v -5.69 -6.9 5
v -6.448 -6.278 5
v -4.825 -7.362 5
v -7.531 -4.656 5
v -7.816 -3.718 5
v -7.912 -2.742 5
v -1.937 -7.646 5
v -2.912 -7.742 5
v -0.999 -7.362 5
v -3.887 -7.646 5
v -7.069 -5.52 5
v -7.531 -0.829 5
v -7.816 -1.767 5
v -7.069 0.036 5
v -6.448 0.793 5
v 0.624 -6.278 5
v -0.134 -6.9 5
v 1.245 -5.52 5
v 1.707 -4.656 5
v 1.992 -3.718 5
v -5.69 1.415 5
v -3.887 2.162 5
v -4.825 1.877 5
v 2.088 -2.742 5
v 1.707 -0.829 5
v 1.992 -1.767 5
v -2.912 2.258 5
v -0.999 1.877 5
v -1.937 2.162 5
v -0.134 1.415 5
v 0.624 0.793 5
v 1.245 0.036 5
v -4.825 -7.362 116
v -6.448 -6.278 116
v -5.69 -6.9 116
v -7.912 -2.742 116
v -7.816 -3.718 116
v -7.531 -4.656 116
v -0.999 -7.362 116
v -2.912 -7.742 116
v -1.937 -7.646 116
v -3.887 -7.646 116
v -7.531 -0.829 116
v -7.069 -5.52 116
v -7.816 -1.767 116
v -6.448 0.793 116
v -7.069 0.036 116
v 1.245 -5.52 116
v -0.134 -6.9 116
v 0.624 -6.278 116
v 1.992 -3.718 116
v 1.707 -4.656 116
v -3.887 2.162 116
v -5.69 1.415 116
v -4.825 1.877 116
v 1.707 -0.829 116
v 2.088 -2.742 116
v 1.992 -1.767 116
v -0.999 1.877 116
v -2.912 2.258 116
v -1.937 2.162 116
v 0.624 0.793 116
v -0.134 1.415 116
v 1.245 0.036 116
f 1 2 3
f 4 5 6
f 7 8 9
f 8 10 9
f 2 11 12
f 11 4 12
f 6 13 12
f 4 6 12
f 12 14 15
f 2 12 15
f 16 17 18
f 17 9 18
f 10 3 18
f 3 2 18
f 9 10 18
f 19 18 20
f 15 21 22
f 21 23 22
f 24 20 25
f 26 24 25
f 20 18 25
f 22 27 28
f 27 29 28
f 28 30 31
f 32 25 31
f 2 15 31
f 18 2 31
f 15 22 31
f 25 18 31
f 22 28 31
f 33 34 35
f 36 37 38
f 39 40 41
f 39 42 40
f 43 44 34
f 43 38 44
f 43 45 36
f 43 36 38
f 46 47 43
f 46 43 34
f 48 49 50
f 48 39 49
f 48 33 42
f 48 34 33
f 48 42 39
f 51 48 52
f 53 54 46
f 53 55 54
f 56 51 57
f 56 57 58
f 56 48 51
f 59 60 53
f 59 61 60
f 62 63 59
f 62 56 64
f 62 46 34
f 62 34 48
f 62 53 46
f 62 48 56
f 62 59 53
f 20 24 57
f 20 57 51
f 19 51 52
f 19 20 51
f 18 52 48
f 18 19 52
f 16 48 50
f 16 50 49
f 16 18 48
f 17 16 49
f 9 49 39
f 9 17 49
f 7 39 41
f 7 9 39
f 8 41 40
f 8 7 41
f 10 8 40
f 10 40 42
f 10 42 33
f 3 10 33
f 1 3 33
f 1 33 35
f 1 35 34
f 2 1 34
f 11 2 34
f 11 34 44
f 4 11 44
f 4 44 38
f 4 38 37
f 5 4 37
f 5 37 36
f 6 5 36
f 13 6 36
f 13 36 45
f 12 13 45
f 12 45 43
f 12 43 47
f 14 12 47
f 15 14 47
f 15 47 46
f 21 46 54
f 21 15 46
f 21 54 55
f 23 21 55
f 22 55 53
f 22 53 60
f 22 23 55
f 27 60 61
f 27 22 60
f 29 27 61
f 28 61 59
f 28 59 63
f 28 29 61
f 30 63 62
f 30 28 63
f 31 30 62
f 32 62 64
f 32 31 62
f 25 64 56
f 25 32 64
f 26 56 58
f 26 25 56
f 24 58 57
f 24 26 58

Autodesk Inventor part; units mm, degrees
ref_plane "YZ Plane" through (0, 0, 0) normal (1, 0, 0) x (0, 1, 0)
ref_plane "XZ Plane" through (0, 0, 0) normal (0, 1, 0) x (-1, 0, 0)
ref_plane "XY Plane" through (0, 0, 0) normal (0, 0, 1) x (1, 0, 0)
sketch "Szkic1" plane through (0, 0, 0) normal (0, 0, 1) x (1, 0, 0)
  circle A0 centre (-2.912, -2.7423) radius 5.3 projected
  circle A1 centre (-2.912, -2.7423) radius 5
  point P0 (0, 0)
  dimension "d0" = 10
extrude "Wyciągnięcie proste1" add sketch "Szkic1" along normal blind 120 contours A1
move faces "Przesuń1" translate (0, 0, 5) faces at (-3.1129, -4.3968, 0)
move faces "Przesuń2" translate (0, 0, -4) faces at (-4.5787, -2.7423, 120)
properties part number "wał_2"
